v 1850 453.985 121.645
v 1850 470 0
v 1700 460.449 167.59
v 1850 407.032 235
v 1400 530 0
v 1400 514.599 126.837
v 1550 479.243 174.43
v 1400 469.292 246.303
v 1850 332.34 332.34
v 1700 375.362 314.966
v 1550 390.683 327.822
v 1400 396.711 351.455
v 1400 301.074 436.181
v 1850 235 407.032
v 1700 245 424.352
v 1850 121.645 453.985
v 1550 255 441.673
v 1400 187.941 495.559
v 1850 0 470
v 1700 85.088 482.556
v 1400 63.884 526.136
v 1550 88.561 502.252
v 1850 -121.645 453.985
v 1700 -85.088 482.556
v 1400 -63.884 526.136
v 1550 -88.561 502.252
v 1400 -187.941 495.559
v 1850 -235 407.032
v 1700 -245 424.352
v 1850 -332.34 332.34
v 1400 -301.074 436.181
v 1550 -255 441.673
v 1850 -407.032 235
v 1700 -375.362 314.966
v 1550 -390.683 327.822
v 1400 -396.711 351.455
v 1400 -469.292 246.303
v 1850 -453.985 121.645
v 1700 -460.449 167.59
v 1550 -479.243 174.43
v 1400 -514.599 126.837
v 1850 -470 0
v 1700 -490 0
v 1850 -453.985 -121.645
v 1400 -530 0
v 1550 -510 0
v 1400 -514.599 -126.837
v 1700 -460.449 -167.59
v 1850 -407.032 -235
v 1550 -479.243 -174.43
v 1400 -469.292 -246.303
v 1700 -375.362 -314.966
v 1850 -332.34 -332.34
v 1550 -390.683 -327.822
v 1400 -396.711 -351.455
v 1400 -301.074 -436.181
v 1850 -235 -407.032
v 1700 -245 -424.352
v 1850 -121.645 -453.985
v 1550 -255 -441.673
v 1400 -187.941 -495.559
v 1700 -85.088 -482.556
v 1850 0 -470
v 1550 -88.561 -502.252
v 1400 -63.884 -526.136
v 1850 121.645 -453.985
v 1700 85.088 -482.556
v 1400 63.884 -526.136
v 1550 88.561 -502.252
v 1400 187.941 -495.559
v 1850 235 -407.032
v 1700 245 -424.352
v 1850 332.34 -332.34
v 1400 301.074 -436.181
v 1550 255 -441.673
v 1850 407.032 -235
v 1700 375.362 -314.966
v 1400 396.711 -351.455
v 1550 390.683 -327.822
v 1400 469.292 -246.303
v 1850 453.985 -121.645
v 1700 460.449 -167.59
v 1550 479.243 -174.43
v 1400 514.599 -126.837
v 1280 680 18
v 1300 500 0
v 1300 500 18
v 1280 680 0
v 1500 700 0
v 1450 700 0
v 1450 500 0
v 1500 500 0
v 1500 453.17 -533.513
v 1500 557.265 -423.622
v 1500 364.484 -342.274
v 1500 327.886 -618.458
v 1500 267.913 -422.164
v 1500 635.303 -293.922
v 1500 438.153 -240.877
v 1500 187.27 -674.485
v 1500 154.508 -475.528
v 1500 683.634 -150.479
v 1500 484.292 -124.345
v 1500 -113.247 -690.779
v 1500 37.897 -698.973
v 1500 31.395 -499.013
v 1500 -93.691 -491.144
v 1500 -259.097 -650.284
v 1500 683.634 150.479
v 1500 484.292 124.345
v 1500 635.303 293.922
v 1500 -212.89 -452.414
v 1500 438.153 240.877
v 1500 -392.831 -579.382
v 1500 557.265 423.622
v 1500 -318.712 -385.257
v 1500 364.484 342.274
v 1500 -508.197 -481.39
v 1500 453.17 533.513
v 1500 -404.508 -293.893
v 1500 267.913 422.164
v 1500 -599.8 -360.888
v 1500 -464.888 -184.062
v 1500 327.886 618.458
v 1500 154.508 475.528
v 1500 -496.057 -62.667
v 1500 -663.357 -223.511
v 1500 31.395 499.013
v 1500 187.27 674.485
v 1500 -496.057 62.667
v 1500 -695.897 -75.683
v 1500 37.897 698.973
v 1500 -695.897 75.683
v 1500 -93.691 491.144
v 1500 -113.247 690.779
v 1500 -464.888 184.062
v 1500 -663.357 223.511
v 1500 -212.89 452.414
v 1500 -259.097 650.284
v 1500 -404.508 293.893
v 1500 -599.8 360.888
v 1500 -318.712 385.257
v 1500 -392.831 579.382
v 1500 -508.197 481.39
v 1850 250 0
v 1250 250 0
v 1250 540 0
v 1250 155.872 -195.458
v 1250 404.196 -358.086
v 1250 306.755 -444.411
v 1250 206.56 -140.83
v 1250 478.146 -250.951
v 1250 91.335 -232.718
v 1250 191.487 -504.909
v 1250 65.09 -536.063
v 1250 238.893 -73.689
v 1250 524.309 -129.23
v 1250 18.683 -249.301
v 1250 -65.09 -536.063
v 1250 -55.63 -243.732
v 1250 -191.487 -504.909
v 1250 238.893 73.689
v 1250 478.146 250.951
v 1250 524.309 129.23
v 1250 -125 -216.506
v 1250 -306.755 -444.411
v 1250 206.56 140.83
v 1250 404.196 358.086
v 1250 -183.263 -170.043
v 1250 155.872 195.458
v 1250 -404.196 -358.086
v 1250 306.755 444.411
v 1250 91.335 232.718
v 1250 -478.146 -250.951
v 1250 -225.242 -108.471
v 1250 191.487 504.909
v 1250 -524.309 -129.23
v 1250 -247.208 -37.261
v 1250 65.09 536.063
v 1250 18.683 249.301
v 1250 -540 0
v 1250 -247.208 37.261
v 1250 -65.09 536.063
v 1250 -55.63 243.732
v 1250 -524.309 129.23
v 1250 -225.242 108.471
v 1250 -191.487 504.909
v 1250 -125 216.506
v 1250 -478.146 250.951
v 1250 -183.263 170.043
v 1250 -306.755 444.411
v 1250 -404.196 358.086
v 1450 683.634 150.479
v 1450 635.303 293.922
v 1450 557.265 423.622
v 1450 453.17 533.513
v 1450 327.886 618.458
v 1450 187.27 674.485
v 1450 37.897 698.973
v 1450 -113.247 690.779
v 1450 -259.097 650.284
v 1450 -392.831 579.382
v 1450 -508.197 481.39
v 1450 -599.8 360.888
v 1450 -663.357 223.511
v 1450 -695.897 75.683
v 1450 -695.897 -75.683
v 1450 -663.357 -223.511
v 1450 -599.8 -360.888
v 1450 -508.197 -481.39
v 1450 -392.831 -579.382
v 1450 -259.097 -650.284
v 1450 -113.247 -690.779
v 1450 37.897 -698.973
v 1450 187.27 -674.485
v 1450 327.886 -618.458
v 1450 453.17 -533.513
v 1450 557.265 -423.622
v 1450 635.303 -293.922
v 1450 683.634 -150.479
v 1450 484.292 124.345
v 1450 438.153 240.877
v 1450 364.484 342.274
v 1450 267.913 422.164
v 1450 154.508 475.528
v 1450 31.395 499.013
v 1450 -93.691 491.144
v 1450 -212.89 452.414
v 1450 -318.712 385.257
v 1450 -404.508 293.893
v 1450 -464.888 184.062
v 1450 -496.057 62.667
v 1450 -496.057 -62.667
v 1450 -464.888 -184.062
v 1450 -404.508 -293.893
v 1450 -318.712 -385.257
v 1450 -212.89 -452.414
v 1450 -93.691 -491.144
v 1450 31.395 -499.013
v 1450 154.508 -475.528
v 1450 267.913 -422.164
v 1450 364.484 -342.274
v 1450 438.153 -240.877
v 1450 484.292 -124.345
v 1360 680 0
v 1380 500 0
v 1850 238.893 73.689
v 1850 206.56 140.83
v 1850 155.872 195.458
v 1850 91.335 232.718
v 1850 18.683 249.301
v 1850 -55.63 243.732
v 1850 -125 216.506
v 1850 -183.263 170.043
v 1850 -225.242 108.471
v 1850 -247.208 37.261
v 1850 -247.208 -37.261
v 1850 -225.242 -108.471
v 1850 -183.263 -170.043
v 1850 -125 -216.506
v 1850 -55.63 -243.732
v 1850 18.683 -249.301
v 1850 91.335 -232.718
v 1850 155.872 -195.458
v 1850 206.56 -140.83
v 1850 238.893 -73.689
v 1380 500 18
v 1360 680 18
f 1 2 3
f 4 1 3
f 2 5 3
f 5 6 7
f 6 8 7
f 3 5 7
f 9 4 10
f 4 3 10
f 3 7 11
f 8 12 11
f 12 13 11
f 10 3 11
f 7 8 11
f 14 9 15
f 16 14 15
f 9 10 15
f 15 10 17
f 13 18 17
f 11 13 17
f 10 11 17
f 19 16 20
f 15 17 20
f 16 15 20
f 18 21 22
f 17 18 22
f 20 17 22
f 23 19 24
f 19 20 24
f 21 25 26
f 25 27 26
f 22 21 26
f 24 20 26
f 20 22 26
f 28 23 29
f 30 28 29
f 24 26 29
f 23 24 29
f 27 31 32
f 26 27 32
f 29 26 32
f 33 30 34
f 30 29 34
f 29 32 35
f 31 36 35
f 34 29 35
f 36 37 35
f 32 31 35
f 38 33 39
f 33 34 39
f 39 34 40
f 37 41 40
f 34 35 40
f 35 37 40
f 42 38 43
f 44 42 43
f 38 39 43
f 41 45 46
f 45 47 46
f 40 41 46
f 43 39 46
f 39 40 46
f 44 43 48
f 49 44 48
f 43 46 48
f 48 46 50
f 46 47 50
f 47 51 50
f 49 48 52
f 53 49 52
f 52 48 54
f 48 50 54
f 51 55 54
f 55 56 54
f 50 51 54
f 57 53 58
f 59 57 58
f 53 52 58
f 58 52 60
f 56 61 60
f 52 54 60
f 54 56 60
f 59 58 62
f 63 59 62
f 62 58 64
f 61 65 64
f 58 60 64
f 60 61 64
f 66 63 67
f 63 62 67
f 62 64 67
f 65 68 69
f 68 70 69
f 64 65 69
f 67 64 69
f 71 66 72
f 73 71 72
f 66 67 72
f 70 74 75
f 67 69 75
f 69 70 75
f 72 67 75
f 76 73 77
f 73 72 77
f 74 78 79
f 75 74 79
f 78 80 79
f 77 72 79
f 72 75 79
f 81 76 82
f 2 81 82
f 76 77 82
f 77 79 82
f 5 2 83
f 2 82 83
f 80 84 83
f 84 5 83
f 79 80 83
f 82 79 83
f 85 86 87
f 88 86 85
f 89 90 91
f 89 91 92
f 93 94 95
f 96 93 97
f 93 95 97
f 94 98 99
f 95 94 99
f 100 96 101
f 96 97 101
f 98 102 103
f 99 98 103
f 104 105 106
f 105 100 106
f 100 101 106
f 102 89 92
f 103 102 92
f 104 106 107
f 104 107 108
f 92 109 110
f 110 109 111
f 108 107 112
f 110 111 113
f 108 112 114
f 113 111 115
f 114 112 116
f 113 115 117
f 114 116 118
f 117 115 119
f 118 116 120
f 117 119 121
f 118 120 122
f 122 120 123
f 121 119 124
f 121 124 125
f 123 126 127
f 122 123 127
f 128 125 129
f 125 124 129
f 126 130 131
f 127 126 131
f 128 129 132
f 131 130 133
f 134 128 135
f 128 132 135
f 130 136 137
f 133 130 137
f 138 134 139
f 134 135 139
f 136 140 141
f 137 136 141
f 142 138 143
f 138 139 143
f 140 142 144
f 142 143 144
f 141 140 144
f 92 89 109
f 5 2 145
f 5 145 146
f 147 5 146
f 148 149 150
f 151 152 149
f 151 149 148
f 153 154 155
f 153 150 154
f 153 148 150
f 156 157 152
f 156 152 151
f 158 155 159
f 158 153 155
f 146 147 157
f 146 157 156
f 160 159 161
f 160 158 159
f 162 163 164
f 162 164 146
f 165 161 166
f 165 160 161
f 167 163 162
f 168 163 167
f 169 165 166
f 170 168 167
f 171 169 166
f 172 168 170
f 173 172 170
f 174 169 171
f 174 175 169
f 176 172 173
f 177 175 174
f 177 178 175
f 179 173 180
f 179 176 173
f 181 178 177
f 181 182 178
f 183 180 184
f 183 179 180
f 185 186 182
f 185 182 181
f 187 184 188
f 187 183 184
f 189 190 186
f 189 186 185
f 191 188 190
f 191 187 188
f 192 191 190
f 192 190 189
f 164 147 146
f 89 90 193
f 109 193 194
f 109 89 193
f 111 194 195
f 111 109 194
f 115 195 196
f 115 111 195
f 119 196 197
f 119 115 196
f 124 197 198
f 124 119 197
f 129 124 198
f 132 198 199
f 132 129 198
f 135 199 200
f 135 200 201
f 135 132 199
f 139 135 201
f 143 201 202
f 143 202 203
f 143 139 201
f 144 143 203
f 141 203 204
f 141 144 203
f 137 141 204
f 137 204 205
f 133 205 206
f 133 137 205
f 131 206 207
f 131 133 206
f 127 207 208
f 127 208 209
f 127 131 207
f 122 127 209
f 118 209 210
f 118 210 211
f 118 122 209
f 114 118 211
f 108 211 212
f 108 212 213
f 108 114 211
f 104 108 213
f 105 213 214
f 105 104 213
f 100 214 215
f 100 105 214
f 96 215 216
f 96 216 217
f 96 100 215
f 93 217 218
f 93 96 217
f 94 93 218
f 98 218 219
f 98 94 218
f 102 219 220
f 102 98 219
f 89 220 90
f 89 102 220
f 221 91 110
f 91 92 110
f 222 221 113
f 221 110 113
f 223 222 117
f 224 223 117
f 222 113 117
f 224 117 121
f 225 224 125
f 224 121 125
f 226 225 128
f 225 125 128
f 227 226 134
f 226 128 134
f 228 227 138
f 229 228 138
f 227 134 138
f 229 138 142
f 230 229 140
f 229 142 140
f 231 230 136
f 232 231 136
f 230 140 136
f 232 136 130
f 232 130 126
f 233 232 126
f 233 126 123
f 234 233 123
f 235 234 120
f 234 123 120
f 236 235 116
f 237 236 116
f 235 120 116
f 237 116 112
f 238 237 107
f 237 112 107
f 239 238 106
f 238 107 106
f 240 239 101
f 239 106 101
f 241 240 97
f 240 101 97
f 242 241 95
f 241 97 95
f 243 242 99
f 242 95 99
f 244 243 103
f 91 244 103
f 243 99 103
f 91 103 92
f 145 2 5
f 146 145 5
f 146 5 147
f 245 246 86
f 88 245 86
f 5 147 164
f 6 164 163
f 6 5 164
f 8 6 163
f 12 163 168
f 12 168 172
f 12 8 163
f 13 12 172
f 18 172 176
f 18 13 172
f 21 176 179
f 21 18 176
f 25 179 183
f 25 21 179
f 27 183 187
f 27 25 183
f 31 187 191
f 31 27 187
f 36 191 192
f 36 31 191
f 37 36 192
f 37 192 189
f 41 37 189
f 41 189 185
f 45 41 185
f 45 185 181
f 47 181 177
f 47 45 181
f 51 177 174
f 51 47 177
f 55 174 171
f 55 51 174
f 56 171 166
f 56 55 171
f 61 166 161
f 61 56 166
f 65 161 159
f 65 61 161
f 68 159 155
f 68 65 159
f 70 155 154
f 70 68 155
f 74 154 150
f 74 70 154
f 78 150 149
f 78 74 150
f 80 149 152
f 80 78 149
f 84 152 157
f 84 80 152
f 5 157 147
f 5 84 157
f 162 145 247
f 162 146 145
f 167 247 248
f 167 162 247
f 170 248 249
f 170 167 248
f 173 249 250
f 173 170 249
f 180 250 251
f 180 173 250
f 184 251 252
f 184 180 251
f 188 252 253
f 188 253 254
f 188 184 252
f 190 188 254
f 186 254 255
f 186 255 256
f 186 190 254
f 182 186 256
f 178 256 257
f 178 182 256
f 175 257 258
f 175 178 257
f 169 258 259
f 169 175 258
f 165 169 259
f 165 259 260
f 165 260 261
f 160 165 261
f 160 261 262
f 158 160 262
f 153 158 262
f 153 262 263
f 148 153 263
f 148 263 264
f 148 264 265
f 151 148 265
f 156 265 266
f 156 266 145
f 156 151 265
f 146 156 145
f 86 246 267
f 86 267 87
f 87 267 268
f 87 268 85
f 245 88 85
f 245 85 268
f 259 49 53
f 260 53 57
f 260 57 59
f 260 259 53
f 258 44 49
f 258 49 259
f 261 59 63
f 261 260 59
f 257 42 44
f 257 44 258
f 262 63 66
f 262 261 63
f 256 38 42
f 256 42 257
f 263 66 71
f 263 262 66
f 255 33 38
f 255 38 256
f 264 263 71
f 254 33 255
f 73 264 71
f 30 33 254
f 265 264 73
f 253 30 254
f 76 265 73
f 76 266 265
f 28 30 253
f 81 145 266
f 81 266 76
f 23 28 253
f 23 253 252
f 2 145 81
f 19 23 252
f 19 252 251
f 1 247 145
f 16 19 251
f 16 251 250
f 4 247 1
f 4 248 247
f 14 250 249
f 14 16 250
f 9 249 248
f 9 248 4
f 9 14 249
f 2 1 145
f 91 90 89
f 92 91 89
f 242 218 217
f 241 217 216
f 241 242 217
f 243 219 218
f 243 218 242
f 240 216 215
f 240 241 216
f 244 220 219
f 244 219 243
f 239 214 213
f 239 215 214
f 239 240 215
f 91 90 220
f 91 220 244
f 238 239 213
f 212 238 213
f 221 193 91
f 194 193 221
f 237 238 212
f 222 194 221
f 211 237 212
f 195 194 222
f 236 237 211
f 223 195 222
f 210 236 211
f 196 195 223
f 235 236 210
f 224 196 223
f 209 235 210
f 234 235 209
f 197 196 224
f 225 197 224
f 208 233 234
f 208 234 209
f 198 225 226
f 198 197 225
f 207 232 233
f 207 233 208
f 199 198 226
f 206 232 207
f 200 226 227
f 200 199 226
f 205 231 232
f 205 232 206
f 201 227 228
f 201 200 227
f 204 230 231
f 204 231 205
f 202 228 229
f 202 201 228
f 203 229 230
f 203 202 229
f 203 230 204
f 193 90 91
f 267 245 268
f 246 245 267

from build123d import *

# Parameters (mm, degrees)
REVOLVE1_ANGLE      = 359.999999589
BOSS_EXTRUDE1_DEPTH = 18
SKETCH3_W           = 50
SKETCH3_H           = 200
REVOLVE2_ANGLE      = 359.999999589


with BuildPart() as part:
    # Sketch1 → Revolve1 (revolve)
    with BuildSketch(Plane.XY):
        Polygon((1250, 250), (1250, 540), (1400, 530), (1550, 510), (1700, 490), (1850, 470), (1850, 250), align=None)
    revolve(axis=Axis((0, 0, 0), (1, 0, 0)), revolution_arc=REVOLVE1_ANGLE)


with BuildPart() as body_2:
    # Sketch2 → Boss-Extrude1 (new body)
    with BuildSketch(Plane.XY):
        Polygon((1300, 500), (1280, 680), (1360, 680), (1380, 500), align=None)
    extrude(amount=BOSS_EXTRUDE1_DEPTH)


with BuildPart() as body_3:
    # Sketch3 → Revolve2 (revolve)
    with BuildSketch(Plane.XY):
        with Locations((1475, 600)):
            Rectangle(SKETCH3_W, SKETCH3_H)
    revolve(axis=Axis((0, 0, 0), (1, 0, 0)), revolution_arc=REVOLVE2_ANGLE)


solid = Compound([part.part, body_2.part, body_3.part])
